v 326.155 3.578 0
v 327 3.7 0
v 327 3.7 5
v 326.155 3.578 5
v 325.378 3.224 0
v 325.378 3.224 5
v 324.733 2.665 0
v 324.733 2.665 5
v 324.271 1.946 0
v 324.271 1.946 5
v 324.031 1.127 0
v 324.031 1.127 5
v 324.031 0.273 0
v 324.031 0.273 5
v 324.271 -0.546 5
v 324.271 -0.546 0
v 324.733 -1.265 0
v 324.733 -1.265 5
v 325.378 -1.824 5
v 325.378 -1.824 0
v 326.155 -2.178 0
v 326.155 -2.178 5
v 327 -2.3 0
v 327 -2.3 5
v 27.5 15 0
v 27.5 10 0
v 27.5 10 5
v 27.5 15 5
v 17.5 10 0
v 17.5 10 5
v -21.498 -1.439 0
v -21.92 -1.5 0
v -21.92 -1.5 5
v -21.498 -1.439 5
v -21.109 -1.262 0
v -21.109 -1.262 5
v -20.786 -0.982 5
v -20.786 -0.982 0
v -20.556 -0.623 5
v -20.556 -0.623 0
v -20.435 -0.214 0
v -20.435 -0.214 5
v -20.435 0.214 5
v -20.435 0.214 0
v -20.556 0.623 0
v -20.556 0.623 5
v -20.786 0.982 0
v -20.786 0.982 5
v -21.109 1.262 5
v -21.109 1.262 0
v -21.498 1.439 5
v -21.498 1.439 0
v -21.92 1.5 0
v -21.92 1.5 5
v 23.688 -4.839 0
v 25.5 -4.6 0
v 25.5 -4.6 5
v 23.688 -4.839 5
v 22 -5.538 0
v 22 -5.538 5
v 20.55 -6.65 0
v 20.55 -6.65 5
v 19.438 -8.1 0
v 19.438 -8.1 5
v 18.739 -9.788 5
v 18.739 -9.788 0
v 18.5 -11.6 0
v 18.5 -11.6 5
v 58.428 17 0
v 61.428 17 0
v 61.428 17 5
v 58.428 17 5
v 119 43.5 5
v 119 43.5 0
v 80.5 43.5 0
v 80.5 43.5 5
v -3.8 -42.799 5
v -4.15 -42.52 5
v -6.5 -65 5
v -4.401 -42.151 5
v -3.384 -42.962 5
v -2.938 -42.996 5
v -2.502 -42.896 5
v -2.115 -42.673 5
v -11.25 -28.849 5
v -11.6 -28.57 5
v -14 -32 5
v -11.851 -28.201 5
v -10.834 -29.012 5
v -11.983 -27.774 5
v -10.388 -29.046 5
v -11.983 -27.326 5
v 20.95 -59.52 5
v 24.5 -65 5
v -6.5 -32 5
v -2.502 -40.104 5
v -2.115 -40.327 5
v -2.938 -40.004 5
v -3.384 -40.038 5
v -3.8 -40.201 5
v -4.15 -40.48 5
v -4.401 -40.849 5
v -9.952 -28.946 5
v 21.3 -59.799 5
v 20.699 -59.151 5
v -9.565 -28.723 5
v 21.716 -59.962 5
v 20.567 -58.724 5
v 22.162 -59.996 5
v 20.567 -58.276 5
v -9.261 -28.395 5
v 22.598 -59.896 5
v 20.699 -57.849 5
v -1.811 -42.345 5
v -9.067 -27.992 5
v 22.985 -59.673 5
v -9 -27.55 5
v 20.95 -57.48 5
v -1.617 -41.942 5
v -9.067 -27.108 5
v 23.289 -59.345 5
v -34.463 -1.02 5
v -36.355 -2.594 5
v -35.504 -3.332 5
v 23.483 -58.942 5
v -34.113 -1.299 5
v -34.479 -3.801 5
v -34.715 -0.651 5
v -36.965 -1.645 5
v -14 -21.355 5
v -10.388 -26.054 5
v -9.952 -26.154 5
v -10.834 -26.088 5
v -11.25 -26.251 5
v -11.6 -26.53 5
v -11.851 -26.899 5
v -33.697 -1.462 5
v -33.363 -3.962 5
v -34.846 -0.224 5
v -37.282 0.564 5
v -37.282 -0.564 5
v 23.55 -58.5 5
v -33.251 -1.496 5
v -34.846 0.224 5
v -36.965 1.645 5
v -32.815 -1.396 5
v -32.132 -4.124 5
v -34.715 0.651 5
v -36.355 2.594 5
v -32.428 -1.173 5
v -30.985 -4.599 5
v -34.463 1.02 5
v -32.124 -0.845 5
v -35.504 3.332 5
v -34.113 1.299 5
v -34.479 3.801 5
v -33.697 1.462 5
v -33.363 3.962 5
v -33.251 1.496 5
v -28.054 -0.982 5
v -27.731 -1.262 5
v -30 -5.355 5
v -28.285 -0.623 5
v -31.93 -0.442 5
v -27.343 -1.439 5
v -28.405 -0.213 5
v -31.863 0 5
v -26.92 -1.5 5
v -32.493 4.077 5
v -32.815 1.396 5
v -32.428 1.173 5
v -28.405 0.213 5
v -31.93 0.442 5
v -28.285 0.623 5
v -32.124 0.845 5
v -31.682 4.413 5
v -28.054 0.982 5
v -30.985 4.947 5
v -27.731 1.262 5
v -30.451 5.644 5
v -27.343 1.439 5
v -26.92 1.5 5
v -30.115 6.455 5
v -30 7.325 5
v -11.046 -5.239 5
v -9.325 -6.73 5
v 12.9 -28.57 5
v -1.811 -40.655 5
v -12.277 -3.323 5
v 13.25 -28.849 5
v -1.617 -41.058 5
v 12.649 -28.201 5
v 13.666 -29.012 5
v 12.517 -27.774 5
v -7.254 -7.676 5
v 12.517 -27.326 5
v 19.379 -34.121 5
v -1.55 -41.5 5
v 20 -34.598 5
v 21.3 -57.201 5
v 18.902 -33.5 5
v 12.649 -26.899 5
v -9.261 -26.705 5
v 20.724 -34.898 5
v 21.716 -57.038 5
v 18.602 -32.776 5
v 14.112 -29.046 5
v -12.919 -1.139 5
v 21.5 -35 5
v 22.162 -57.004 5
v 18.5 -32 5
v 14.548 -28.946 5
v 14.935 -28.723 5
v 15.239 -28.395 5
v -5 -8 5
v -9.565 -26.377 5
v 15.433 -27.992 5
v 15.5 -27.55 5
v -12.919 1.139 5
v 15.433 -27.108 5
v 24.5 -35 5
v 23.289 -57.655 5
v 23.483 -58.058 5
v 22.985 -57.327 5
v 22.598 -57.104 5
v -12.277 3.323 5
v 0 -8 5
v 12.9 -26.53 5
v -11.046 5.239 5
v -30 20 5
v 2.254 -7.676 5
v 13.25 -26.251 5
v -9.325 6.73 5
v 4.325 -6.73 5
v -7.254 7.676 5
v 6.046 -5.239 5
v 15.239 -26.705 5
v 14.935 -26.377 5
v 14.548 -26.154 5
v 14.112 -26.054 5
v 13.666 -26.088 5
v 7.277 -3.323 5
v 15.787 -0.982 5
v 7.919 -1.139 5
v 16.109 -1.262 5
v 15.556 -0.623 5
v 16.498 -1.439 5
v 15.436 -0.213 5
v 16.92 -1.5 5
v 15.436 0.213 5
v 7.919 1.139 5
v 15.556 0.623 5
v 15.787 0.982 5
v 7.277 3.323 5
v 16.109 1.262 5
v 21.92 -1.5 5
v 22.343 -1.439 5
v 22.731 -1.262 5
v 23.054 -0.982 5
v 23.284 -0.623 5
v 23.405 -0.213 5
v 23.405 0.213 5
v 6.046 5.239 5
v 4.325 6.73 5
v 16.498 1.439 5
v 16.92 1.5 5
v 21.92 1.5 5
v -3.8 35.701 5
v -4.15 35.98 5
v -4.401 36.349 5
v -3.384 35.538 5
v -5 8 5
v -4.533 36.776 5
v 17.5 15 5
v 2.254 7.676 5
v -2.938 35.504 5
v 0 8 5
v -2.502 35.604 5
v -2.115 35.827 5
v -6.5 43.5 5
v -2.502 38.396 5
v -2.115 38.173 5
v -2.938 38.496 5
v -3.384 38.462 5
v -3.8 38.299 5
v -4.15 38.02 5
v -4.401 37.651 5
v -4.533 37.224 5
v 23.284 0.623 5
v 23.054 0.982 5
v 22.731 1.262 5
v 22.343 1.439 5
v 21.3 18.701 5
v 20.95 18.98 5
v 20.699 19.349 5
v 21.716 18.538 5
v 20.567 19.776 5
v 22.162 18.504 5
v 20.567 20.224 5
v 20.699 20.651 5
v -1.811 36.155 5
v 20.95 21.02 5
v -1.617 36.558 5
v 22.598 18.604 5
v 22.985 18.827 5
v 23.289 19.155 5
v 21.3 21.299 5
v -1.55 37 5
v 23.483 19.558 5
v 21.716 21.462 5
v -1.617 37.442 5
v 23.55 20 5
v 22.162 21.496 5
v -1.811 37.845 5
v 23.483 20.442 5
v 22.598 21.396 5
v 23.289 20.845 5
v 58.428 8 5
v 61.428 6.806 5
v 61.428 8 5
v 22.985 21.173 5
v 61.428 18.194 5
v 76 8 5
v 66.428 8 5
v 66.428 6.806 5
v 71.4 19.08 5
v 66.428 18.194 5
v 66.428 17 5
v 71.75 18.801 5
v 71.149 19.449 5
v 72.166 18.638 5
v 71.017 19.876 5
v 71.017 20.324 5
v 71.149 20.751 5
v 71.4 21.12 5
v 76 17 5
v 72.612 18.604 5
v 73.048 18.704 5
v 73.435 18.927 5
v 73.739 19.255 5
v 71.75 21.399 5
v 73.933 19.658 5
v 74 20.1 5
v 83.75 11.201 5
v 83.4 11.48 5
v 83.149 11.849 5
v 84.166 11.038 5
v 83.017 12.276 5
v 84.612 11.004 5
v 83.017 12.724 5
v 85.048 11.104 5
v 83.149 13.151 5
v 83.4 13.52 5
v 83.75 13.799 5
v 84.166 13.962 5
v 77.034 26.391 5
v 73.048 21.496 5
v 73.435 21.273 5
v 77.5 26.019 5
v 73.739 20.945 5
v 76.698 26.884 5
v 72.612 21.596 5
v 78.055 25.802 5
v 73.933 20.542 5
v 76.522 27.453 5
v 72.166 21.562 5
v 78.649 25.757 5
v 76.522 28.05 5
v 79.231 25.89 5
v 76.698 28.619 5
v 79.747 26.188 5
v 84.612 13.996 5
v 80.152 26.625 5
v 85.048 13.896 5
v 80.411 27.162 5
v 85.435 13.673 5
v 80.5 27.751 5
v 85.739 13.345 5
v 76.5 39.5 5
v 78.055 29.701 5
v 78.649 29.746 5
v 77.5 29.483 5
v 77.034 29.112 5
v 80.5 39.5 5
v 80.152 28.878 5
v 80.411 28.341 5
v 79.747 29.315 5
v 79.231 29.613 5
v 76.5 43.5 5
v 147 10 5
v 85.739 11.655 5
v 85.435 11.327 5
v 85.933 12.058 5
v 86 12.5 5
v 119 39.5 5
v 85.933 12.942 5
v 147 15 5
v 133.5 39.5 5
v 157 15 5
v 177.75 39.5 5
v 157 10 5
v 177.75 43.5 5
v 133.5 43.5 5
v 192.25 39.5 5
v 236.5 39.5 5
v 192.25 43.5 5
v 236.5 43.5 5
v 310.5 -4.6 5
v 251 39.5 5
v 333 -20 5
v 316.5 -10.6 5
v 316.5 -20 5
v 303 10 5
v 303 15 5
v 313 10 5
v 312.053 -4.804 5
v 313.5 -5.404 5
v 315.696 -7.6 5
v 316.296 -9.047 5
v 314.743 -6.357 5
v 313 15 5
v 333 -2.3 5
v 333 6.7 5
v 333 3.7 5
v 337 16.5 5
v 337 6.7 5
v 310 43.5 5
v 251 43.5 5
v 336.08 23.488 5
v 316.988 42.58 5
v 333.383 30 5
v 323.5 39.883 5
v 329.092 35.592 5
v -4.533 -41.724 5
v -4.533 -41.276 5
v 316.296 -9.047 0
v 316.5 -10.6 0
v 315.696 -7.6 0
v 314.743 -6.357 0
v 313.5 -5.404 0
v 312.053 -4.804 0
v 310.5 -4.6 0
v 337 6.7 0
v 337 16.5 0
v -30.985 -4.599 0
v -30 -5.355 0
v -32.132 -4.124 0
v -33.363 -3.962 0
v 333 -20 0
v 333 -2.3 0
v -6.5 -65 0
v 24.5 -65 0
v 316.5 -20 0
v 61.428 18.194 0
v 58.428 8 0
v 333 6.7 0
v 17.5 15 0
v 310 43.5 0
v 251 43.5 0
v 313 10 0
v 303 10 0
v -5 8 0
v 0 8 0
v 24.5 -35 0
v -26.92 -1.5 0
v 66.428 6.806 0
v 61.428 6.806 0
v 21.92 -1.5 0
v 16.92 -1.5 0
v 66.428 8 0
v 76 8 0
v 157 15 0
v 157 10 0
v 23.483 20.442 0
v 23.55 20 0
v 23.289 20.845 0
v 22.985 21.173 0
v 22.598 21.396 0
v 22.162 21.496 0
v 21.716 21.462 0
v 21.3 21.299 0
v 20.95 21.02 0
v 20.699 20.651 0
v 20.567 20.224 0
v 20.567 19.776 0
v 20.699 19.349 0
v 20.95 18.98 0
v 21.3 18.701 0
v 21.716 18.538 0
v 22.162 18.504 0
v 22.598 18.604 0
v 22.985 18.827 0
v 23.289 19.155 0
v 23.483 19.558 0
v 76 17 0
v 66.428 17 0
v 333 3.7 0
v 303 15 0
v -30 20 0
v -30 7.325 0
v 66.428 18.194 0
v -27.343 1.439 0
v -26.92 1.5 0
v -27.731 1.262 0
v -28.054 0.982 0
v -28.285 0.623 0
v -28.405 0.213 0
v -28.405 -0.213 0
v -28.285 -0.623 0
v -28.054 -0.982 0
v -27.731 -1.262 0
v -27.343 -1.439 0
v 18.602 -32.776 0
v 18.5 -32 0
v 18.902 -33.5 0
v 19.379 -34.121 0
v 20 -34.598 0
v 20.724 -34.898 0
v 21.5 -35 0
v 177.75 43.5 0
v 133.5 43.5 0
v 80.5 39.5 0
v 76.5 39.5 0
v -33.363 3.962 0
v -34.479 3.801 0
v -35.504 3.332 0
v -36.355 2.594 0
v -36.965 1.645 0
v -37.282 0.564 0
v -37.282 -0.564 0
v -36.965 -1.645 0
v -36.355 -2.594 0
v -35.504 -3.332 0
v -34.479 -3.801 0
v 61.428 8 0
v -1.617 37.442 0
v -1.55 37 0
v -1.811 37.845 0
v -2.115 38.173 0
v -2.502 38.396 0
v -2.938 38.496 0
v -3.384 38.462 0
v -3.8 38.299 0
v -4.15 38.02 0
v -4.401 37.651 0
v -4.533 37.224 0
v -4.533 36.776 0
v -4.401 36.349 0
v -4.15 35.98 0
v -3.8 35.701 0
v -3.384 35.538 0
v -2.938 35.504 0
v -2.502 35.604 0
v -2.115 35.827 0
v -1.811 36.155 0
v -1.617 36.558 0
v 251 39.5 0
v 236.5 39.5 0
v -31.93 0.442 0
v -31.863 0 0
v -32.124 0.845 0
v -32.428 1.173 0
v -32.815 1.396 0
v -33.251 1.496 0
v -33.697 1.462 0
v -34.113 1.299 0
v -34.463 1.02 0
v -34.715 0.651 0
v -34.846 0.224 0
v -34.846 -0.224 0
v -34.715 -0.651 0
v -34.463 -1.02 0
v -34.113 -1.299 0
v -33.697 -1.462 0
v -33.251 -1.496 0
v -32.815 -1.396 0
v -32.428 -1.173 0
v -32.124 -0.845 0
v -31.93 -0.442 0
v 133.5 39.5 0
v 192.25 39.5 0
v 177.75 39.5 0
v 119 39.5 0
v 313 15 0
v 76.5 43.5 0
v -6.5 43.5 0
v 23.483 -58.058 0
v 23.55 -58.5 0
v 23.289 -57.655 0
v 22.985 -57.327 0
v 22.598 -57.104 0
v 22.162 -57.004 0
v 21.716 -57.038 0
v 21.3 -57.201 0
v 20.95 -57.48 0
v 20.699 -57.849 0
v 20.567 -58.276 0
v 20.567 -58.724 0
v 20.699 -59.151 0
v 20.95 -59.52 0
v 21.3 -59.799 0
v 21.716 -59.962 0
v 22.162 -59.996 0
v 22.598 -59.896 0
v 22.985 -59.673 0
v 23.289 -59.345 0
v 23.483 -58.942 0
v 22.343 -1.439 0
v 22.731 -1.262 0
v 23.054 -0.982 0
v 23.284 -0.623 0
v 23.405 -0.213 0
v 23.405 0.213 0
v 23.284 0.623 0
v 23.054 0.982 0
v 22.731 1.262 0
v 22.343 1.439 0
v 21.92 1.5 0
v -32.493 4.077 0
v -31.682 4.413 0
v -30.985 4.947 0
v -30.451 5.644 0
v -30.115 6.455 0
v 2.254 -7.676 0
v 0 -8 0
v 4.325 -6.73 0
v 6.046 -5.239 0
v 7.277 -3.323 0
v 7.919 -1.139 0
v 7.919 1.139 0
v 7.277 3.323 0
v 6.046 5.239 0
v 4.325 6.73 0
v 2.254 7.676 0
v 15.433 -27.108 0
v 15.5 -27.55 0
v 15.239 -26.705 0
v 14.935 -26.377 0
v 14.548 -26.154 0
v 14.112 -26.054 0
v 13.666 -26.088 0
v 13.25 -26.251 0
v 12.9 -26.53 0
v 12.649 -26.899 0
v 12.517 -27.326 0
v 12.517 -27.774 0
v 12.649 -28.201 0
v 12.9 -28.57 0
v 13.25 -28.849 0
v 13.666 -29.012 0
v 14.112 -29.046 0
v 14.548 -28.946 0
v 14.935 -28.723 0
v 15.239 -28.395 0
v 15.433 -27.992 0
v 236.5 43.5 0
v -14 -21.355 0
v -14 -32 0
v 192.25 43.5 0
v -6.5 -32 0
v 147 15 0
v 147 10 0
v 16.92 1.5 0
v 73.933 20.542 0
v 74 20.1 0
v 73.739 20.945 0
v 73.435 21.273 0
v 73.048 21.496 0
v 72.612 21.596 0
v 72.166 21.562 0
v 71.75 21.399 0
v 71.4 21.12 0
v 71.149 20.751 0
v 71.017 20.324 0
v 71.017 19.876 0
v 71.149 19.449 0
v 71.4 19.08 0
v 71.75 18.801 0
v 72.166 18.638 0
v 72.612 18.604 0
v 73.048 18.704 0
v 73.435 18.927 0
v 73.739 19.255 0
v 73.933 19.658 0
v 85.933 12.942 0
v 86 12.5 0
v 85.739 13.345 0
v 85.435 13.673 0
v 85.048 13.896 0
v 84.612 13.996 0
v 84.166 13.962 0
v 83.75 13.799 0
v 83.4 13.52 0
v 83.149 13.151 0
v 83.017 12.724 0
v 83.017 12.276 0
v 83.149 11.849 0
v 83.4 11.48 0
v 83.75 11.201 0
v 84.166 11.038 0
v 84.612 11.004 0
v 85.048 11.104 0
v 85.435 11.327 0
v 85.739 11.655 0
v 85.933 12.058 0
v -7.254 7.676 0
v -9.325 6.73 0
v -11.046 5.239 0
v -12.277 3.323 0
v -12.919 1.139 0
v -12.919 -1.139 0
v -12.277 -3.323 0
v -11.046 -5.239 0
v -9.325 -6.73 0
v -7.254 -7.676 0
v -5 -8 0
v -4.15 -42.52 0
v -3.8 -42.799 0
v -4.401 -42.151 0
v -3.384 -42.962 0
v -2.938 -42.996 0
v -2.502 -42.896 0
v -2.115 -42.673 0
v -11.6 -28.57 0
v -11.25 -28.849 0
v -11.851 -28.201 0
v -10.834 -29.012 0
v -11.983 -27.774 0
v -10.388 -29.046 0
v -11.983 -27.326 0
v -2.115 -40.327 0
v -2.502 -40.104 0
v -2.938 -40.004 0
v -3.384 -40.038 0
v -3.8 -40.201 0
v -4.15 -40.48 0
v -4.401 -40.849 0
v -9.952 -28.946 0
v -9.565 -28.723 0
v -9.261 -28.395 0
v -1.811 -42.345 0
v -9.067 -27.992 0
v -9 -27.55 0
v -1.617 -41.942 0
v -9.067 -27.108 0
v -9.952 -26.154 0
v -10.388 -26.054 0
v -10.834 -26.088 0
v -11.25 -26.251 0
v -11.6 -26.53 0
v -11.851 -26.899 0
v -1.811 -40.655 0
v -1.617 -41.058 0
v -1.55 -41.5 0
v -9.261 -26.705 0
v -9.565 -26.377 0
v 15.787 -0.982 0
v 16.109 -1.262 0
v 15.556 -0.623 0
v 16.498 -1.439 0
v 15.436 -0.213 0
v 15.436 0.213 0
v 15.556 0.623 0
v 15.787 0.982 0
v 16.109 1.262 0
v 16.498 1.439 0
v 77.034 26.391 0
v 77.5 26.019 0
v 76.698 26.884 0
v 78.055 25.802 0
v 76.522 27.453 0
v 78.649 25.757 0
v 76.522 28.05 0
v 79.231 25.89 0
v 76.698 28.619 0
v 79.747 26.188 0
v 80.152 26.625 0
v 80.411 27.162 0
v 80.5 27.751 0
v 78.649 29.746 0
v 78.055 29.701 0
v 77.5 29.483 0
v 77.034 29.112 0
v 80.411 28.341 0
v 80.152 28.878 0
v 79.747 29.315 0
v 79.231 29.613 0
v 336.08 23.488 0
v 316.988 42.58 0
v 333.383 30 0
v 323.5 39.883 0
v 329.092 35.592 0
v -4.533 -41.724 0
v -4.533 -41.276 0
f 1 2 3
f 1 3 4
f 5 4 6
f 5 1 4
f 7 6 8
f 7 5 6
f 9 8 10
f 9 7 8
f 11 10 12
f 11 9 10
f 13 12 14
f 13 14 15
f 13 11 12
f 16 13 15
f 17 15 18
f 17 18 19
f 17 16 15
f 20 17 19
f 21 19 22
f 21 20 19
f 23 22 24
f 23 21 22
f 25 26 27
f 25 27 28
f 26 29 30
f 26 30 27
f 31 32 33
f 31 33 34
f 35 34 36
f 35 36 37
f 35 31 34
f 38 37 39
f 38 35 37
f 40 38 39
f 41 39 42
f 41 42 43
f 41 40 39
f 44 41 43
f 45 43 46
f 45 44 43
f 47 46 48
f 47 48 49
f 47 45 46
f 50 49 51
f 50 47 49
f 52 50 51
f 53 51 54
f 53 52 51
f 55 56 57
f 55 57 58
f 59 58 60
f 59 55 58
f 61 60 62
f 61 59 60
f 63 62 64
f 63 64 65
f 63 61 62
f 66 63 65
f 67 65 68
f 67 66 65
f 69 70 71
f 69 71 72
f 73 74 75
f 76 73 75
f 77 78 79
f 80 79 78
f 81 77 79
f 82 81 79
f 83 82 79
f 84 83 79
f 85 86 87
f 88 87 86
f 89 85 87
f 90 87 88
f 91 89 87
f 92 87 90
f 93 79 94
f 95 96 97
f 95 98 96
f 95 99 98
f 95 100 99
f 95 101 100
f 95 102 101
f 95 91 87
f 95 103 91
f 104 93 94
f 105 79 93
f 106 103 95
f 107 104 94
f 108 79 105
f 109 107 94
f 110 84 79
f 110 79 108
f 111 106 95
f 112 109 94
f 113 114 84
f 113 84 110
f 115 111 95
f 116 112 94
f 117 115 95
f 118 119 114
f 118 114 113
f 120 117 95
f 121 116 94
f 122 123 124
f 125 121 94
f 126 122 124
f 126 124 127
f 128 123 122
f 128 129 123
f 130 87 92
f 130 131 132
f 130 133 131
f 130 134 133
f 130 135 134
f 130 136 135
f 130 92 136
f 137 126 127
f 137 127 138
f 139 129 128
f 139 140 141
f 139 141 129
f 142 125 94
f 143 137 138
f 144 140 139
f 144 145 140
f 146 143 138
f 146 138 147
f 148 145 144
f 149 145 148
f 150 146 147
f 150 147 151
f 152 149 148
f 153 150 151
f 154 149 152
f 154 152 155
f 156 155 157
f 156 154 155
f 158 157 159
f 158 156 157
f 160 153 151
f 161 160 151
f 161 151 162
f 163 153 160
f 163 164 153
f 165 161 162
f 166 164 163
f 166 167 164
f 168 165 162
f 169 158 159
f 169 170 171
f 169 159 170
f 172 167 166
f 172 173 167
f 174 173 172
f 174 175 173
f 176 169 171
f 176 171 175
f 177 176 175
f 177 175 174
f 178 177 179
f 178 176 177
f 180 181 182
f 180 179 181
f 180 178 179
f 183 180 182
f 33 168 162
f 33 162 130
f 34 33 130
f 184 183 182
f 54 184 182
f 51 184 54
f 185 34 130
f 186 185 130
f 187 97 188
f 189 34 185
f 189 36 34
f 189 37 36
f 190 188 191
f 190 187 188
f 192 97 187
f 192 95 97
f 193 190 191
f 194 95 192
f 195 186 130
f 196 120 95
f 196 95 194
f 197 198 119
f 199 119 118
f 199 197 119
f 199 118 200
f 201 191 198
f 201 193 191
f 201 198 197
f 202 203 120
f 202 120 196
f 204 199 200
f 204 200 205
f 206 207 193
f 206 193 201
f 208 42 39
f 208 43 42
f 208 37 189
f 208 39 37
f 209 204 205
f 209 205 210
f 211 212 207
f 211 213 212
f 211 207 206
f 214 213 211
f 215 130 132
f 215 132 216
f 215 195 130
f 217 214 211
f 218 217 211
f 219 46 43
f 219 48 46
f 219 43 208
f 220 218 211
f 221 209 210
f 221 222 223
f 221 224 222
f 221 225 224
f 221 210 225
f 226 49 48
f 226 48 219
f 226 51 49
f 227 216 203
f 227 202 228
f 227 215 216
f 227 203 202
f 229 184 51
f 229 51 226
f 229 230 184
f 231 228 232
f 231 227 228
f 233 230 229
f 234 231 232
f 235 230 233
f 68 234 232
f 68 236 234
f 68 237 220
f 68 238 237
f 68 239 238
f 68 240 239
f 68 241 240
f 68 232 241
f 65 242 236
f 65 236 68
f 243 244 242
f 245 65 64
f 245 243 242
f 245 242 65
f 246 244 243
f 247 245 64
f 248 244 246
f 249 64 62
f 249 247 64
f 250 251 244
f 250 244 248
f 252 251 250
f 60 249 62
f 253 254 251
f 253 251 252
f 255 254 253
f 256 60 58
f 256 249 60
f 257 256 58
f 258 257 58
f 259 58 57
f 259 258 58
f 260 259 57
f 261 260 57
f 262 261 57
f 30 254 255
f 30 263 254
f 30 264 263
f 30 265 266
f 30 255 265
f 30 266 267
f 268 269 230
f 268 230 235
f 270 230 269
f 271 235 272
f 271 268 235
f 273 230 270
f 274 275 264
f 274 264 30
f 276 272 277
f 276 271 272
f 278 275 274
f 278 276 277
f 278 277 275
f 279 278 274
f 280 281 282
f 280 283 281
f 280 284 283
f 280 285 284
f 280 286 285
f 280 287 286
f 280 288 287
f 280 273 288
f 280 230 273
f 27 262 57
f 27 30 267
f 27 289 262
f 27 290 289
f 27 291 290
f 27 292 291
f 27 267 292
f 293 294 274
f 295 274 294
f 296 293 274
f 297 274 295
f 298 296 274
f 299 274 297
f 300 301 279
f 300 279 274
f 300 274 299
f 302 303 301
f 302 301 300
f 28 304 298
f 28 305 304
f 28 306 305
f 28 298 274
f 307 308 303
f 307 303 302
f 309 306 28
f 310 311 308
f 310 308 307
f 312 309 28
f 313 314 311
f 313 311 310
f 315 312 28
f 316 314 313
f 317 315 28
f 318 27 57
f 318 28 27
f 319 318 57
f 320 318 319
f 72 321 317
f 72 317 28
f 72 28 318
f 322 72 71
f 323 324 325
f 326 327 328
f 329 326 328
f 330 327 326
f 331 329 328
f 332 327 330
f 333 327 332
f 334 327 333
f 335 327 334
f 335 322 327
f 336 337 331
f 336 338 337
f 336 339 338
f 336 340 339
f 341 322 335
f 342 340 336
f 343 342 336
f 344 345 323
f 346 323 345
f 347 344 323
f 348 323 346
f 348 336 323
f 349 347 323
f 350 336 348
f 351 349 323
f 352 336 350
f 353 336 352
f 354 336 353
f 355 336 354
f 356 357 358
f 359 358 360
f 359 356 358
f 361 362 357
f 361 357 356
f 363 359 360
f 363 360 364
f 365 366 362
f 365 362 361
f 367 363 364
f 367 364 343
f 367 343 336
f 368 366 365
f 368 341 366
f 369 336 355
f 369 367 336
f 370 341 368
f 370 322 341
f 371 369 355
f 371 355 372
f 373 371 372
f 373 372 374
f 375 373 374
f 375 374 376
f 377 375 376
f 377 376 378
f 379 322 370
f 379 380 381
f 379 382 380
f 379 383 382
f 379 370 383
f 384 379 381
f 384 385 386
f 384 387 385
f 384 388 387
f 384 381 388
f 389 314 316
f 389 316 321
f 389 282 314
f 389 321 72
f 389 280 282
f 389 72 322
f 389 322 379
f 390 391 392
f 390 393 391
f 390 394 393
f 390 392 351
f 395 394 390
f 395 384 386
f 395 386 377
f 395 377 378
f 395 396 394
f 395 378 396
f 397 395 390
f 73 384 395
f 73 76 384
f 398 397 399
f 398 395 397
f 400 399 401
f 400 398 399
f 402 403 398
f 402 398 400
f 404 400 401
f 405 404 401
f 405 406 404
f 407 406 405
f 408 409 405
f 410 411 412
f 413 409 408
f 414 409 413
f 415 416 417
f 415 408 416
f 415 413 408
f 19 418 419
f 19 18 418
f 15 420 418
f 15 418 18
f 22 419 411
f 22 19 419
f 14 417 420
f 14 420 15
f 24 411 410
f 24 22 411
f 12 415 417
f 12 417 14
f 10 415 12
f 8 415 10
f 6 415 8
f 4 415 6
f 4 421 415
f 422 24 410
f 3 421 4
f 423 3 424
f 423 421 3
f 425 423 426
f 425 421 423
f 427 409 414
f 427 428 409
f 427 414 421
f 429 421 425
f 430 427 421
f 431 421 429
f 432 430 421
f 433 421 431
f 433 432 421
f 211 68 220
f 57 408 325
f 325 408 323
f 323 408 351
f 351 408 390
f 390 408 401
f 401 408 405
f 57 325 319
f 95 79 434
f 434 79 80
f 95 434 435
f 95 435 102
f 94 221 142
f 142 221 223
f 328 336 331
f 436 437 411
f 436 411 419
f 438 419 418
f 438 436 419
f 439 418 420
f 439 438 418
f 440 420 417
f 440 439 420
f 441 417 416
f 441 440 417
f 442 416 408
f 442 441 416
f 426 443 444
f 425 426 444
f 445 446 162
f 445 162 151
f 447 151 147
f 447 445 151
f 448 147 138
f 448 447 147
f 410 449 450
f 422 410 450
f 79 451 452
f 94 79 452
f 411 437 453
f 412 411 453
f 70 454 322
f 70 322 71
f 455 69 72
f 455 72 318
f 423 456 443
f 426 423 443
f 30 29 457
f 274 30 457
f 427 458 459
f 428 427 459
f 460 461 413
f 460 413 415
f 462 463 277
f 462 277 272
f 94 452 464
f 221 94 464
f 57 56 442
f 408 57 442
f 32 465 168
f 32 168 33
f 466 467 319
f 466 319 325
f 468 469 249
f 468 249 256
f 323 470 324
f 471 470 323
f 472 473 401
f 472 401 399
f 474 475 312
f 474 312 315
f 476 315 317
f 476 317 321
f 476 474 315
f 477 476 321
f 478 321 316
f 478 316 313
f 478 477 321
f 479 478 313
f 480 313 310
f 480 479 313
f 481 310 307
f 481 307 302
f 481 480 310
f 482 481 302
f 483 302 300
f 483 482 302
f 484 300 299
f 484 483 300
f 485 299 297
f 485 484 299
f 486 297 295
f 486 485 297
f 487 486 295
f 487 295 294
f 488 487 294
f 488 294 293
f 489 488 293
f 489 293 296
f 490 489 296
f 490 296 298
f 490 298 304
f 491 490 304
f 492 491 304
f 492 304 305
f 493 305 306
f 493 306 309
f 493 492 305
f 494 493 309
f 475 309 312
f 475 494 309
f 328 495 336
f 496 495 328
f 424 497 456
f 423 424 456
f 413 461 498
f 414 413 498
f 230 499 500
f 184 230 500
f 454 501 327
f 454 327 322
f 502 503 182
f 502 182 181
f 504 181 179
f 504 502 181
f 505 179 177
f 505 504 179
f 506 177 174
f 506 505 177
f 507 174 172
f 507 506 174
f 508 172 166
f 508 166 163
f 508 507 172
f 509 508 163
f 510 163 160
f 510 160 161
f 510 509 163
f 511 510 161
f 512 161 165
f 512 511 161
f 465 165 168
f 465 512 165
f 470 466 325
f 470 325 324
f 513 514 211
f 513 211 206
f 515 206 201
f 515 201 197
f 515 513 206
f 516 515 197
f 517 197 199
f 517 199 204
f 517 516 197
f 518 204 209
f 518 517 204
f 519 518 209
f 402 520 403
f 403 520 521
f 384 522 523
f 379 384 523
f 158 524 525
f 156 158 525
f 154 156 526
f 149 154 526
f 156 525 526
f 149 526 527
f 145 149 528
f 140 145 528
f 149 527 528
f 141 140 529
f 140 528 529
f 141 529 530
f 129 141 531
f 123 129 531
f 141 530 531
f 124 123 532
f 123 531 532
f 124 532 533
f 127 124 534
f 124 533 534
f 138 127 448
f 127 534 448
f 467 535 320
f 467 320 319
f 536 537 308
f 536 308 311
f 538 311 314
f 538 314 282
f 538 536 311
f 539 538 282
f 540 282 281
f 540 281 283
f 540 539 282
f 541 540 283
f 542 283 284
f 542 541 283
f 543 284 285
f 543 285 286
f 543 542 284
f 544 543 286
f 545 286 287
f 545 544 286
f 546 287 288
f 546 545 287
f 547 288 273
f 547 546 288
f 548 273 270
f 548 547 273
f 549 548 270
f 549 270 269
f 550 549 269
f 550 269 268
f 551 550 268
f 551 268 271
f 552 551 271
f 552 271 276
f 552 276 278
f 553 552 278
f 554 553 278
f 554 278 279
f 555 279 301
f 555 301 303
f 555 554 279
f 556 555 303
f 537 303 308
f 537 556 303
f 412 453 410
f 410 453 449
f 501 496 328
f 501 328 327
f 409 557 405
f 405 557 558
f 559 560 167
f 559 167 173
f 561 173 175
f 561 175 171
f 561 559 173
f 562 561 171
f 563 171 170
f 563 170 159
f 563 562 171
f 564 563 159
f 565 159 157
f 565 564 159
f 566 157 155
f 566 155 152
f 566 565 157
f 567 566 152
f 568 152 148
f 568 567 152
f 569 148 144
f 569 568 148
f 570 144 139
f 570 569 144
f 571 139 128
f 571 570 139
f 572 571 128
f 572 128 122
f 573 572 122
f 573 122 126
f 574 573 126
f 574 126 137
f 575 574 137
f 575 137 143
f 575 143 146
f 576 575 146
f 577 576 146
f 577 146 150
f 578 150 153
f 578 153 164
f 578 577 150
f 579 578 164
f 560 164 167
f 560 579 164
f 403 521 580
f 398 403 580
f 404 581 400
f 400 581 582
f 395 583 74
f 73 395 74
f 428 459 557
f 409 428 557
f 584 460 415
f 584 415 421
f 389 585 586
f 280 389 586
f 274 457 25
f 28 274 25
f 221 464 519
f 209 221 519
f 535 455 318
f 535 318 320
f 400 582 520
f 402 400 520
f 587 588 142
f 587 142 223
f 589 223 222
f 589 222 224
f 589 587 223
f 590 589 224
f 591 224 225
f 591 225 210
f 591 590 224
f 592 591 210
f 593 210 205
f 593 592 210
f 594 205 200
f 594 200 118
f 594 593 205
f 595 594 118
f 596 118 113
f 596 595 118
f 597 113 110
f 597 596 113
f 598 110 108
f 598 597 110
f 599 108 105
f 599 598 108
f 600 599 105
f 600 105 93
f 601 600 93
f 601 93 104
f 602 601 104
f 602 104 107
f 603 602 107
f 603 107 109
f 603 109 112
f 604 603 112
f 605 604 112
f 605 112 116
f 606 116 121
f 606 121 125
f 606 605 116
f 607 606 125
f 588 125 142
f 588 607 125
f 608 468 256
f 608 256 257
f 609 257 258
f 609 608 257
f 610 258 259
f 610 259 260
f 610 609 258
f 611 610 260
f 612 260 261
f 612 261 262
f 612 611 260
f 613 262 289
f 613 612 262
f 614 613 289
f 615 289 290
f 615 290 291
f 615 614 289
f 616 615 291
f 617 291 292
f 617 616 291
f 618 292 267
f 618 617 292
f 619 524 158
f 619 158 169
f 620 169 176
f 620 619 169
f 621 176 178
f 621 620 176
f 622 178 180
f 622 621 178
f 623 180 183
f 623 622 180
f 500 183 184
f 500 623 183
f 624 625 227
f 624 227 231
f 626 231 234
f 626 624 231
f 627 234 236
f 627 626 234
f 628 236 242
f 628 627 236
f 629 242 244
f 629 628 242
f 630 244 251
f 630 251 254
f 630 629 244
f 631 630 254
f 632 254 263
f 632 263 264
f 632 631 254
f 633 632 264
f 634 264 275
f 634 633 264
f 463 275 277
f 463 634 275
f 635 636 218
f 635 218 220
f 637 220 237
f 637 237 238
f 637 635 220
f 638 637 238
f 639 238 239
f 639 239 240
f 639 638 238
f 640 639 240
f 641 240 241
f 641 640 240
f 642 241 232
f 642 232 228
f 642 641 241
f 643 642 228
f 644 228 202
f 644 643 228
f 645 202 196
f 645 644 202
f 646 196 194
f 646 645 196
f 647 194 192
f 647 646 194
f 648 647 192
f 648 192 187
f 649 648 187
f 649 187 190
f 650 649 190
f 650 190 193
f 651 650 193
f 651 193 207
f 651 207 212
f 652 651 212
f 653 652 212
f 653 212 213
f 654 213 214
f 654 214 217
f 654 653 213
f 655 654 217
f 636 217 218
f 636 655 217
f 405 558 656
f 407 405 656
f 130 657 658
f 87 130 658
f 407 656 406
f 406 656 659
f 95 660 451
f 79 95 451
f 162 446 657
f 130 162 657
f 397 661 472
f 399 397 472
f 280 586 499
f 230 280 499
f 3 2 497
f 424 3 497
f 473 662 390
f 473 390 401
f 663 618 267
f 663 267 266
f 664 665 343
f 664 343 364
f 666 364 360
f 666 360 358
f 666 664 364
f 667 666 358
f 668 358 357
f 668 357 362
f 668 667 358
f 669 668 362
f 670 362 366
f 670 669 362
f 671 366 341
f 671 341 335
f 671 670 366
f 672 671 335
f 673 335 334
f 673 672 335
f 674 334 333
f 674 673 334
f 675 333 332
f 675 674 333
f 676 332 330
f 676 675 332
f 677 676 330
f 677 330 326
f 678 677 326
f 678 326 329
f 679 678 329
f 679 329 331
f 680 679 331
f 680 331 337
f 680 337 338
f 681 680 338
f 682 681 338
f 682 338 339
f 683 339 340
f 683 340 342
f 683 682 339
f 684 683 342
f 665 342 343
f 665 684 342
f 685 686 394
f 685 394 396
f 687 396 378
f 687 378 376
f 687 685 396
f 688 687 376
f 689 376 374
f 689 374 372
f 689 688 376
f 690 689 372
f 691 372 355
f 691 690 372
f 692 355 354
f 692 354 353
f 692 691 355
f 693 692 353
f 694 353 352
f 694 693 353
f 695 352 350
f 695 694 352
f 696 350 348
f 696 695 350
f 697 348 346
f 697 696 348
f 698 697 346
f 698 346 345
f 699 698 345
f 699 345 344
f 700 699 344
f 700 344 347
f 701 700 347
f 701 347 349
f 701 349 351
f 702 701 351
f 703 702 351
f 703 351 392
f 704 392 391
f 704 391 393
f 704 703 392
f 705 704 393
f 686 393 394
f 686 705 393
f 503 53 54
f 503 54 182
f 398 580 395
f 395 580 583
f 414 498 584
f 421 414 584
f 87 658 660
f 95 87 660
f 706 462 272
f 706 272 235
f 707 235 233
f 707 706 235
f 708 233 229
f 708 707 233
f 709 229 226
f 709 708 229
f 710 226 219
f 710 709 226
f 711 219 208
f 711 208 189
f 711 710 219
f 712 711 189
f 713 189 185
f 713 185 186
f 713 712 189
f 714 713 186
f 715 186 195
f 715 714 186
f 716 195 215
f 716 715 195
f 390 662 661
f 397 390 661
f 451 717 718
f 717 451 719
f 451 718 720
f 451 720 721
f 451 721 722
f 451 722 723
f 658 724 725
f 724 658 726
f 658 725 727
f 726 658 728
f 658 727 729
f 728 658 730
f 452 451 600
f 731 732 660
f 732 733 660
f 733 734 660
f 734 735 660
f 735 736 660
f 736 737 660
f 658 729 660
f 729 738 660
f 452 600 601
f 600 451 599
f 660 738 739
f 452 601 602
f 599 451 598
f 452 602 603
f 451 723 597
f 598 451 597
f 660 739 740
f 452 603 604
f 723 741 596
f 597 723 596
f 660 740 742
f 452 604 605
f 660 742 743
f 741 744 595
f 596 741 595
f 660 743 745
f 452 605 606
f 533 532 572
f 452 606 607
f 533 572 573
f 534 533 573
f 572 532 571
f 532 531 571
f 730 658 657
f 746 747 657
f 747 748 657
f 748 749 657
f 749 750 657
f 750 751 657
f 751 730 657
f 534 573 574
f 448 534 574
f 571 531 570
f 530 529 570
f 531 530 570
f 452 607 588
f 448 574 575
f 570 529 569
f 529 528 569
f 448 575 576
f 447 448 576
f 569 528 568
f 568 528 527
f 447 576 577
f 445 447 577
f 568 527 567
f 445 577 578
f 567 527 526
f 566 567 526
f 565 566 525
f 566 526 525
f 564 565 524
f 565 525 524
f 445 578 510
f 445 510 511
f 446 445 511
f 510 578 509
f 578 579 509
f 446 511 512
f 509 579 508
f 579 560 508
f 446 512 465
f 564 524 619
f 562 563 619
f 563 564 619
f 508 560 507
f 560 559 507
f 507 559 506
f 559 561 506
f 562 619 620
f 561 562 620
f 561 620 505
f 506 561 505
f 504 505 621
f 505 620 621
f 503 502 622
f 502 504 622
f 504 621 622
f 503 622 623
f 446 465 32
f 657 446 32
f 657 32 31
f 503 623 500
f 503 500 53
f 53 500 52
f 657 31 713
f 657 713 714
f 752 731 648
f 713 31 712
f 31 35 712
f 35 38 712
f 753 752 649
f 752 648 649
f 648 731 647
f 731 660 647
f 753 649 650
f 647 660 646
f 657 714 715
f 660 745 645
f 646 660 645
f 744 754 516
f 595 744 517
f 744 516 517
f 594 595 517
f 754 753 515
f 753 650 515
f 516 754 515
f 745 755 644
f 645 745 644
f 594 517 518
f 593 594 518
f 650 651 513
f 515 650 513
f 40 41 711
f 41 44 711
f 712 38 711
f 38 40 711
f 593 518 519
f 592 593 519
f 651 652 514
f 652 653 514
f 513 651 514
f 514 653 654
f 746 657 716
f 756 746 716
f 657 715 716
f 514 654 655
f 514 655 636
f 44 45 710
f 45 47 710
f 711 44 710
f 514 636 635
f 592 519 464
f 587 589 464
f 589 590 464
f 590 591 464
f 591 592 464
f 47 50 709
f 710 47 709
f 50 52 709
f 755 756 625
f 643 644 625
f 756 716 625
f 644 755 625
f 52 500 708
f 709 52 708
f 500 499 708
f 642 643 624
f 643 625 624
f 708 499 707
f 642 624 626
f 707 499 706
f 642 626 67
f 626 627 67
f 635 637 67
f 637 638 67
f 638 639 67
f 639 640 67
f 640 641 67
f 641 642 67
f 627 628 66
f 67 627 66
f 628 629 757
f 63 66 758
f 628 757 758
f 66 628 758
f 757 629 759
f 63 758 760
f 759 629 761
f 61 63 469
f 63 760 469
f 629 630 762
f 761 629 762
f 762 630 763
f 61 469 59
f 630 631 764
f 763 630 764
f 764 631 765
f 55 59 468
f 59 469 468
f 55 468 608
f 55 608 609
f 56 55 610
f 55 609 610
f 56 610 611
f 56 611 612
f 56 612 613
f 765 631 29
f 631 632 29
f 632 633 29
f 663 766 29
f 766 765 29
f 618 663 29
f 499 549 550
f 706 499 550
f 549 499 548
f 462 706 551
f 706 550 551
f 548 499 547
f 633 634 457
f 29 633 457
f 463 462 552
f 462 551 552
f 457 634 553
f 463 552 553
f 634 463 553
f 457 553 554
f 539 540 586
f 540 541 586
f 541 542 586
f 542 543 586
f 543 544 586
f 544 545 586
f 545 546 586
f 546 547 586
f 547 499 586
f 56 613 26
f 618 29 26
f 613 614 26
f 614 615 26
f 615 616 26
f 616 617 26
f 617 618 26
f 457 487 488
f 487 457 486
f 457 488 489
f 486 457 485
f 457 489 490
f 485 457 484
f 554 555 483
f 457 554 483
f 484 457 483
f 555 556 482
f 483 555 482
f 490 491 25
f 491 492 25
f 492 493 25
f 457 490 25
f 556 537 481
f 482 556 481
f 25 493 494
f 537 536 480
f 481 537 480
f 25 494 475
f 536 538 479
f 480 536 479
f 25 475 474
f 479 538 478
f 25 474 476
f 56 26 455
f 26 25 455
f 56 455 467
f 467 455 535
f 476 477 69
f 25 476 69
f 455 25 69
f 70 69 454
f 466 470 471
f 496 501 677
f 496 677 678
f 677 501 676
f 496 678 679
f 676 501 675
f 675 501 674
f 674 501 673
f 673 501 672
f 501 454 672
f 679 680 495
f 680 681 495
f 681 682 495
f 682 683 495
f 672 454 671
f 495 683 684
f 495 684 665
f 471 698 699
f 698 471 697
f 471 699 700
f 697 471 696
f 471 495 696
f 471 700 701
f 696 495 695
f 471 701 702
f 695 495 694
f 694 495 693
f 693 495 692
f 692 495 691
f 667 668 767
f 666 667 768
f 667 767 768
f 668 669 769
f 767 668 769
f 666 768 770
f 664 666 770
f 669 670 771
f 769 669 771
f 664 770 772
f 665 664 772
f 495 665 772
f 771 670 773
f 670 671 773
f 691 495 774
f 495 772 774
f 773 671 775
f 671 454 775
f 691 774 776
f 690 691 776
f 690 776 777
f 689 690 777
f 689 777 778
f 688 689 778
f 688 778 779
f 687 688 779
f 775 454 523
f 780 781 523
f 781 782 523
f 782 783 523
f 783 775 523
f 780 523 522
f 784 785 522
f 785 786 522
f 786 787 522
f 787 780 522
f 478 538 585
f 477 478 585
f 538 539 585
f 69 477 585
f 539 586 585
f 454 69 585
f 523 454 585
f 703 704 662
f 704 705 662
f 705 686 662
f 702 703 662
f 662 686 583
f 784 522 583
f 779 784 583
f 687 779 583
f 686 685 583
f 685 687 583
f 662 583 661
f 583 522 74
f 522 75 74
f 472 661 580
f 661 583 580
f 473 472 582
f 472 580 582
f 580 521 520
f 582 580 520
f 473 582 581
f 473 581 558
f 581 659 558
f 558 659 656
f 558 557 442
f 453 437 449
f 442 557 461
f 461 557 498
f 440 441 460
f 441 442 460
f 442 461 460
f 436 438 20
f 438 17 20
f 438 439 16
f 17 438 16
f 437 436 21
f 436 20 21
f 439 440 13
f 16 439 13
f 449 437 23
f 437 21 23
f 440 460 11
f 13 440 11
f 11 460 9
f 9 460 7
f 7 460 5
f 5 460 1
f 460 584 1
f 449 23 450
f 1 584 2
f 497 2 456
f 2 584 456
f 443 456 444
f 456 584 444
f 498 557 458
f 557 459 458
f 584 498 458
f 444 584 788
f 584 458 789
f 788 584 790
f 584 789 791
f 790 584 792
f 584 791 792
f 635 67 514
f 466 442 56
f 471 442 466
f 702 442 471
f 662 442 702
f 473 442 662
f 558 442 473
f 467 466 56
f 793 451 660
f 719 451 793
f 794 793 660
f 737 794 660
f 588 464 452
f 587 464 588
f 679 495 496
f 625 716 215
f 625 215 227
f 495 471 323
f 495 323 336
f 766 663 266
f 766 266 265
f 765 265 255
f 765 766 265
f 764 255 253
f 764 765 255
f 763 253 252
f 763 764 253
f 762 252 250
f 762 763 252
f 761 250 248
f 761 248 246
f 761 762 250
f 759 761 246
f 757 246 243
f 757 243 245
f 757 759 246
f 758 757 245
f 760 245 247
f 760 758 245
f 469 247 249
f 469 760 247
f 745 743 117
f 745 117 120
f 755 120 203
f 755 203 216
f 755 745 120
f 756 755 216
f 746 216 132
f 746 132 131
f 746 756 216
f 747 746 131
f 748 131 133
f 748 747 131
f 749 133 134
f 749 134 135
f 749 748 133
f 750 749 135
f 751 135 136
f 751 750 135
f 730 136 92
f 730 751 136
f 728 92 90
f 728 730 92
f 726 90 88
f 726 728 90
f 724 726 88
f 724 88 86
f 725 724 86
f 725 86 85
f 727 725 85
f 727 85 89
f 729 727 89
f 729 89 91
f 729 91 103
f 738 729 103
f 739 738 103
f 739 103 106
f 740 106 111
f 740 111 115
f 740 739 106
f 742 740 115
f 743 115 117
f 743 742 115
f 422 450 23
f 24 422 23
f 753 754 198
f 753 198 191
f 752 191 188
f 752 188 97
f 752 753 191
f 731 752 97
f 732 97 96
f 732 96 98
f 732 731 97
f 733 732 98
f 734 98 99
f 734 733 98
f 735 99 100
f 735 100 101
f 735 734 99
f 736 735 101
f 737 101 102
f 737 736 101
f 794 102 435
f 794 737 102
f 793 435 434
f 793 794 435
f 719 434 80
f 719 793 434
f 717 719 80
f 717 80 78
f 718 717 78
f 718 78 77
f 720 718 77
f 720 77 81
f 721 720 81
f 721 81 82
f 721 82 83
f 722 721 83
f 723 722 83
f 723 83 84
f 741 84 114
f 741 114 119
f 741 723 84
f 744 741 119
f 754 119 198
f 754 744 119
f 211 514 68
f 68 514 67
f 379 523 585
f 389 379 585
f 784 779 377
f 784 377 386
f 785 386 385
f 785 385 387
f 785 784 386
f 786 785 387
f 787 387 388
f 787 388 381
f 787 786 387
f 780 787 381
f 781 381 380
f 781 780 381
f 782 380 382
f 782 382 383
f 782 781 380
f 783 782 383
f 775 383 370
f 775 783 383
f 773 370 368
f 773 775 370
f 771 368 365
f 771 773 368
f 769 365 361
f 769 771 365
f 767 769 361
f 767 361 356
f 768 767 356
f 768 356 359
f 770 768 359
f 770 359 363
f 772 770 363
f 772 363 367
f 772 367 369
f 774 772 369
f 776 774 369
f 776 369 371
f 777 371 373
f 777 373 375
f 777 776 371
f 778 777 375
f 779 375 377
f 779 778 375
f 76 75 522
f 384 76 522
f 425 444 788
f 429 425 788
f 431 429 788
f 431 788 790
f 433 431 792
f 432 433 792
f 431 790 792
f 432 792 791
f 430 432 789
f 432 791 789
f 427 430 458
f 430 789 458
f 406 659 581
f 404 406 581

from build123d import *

# Parameters (mm, degrees)
SKETCH090_R   = 2
SKETCH090_R_2 = 1.5
SKETCH090_W   = 10
SKETCH090_H   = 5
PAD_DEPTH     = 5


with BuildPart() as part:
    # Sketch090 → Pad (new body)
    with BuildSketch(Plane.XY):
        with BuildLine():
            Line((24.5, -35), (21.5, -35))
            ThreePointArc((18.5, -32), (19.37868, -34.12132), (21.5, -35))
            Line((18.5, -32), (18.5, -11.6))
            ThreePointArc((25.5, -4.6), (20.550253, -6.650253), (18.5, -11.6))
            Line((25.5, -4.6), (310.5, -4.6))
            ThreePointArc((316.5, -10.6), (314.742641, -6.357359), (310.5, -4.6))
            Line((316.5, -10.6), (316.5, -20))
            Line((316.5, -20), (333, -20))
            Line((333, -20), (333, -2.3))
            Line((333, -2.3), (327, -2.3))
            ThreePointArc((327, 3.7), (324, 0.7), (327, -2.3))
            Line((327, 3.7), (333, 3.7))
            Line((333, 3.7), (333, 6.7))
            Line((333, 6.7), (337, 6.7))
            Line((337, 6.7), (337, 16.5))
            ThreePointArc((337, 16.5), (329.091883, 35.591883), (310, 43.5))
            Line((310, 43.5), (251, 43.5))
            Line((251, 43.5), (251, 39.5))
            Line((251, 39.5), (236.5, 39.5))
            Line((236.5, 39.5), (236.5, 43.5))
            Line((236.5, 43.5), (192.25, 43.5))
            Line((192.25, 43.5), (192.25, 39.5))
            Line((192.25, 39.5), (177.75, 39.5))
            Line((177.75, 39.5), (177.75, 43.5))
            Line((177.75, 43.5), (133.5, 43.5))
            Line((133.5, 43.5), (133.5, 39.5))
            Line((133.5, 39.5), (119, 39.5))
            Line((119, 39.5), (119, 43.5))
            Line((119, 43.5), (80.5, 43.5))
            Line((80.5, 43.5), (80.5, 39.5))
            Line((80.5, 39.5), (76.5, 39.5))
            Line((76.5, 39.5), (76.5, 43.5))
            Line((76.5, 43.5), (-6.5, 43.5))
            Line((-6.5, 43.5), (-30, 20))
            Line((-30, 20), (-30, 7.325415))
            ThreePointArc((-33.363129, 3.962285), (-30.985038, 4.947323), (-30, 7.325415))
            ThreePointArc((-33.363129, 3.962285), (-37.322286, 0), (-33.363129, -3.962285))
            ThreePointArc((-30, -5.355339), (-31.543017, -4.324328), (-33.363129, -3.962285))
            Line((-30, -5.355339), (-14, -21.355339))
            Line((-14, -21.355339), (-14, -32))
            Line((-14, -32), (-6.5, -32))
            Line((-6.5, -32), (-6.5, -65))
            Line((-6.5, -65), (24.5, -65))
            Line((24.5, -65), (24.5, -35))
        make_face()
        with Locations((78.5, 27.751426)):
            Circle(SKETCH090_R, mode=Mode.SUBTRACT)
        with Locations((-3.05, -41.5)):
            Circle(SKETCH090_R_2, mode=Mode.SUBTRACT)
        with Locations((84.5, 12.5)):
            Circle(SKETCH090_R_2, mode=Mode.SUBTRACT)
        with Locations((22.05, -58.5)):
            Circle(SKETCH090_R_2, mode=Mode.SUBTRACT)
        with Locations((72.5, 20.1)):
            Circle(SKETCH090_R_2, mode=Mode.SUBTRACT)
        with Locations((-33.363129, 0)):
            Circle(SKETCH090_R_2, mode=Mode.SUBTRACT)
        with Locations((-10.5, -27.55)):
            Circle(SKETCH090_R_2, mode=Mode.SUBTRACT)
        with Locations((14, -27.55)):
            Circle(SKETCH090_R_2, mode=Mode.SUBTRACT)
        with Locations((-3.05, 37)):
            Circle(SKETCH090_R_2, mode=Mode.SUBTRACT)
        with Locations((22.05, 20)):
            Circle(SKETCH090_R_2, mode=Mode.SUBTRACT)
        Polygon((66.42768, 17), (66.42768, 18.193898), (61.42768, 18.193898), (61.42768, 17), (58.42768, 17), (58.42768, 8), (61.42768, 8), (61.42768, 6.806102), (66.42768, 6.806102), (66.42768, 8), (76, 8), (76, 17), align=None, mode=Mode.SUBTRACT)
        with BuildLine():
            ThreePointArc((21.92031, -1.500002), (23.42, -2e-06), (21.92031, 1.499998))
            Line((21.92031, 1.499998), (16.92031, 1.5))
            ThreePointArc((16.92031, 1.5), (15.42031, 0), (16.92031, -1.5))
            Line((16.92031, -1.5), (21.92031, -1.500002))
        make_face(mode=Mode.SUBTRACT)
        with BuildLine():
            Line((-21.92031, 1.5), (-26.92031, 1.5))
            ThreePointArc((-26.92031, 1.5), (-28.42031, 0), (-26.92031, -1.5))
            Line((-26.92031, -1.5), (-21.92031, -1.5))
            ThreePointArc((-21.92031, -1.5), (-20.42, 0), (-21.92031, 1.5))
        make_face(mode=Mode.SUBTRACT)
        with Locations((152, 12.5)):
            Rectangle(SKETCH090_W, SKETCH090_H, mode=Mode.SUBTRACT)
        with Locations((308, 12.5)):
            Rectangle(SKETCH090_W, SKETCH090_H, mode=Mode.SUBTRACT)
        with BuildLine():
            Line((-5, -8), (0, -8))
            ThreePointArc((0, -8), (8, 0), (0, 8))
            Line((0, 8), (-5, 8))
            ThreePointArc((-5, 8), (-13, 0), (-5, -8))
        make_face(mode=Mode.SUBTRACT)
        with Locations((22.5, 12.5)):
            Rectangle(SKETCH090_W, SKETCH090_H, mode=Mode.SUBTRACT)
    extrude(amount=PAD_DEPTH)


solid = part.part
